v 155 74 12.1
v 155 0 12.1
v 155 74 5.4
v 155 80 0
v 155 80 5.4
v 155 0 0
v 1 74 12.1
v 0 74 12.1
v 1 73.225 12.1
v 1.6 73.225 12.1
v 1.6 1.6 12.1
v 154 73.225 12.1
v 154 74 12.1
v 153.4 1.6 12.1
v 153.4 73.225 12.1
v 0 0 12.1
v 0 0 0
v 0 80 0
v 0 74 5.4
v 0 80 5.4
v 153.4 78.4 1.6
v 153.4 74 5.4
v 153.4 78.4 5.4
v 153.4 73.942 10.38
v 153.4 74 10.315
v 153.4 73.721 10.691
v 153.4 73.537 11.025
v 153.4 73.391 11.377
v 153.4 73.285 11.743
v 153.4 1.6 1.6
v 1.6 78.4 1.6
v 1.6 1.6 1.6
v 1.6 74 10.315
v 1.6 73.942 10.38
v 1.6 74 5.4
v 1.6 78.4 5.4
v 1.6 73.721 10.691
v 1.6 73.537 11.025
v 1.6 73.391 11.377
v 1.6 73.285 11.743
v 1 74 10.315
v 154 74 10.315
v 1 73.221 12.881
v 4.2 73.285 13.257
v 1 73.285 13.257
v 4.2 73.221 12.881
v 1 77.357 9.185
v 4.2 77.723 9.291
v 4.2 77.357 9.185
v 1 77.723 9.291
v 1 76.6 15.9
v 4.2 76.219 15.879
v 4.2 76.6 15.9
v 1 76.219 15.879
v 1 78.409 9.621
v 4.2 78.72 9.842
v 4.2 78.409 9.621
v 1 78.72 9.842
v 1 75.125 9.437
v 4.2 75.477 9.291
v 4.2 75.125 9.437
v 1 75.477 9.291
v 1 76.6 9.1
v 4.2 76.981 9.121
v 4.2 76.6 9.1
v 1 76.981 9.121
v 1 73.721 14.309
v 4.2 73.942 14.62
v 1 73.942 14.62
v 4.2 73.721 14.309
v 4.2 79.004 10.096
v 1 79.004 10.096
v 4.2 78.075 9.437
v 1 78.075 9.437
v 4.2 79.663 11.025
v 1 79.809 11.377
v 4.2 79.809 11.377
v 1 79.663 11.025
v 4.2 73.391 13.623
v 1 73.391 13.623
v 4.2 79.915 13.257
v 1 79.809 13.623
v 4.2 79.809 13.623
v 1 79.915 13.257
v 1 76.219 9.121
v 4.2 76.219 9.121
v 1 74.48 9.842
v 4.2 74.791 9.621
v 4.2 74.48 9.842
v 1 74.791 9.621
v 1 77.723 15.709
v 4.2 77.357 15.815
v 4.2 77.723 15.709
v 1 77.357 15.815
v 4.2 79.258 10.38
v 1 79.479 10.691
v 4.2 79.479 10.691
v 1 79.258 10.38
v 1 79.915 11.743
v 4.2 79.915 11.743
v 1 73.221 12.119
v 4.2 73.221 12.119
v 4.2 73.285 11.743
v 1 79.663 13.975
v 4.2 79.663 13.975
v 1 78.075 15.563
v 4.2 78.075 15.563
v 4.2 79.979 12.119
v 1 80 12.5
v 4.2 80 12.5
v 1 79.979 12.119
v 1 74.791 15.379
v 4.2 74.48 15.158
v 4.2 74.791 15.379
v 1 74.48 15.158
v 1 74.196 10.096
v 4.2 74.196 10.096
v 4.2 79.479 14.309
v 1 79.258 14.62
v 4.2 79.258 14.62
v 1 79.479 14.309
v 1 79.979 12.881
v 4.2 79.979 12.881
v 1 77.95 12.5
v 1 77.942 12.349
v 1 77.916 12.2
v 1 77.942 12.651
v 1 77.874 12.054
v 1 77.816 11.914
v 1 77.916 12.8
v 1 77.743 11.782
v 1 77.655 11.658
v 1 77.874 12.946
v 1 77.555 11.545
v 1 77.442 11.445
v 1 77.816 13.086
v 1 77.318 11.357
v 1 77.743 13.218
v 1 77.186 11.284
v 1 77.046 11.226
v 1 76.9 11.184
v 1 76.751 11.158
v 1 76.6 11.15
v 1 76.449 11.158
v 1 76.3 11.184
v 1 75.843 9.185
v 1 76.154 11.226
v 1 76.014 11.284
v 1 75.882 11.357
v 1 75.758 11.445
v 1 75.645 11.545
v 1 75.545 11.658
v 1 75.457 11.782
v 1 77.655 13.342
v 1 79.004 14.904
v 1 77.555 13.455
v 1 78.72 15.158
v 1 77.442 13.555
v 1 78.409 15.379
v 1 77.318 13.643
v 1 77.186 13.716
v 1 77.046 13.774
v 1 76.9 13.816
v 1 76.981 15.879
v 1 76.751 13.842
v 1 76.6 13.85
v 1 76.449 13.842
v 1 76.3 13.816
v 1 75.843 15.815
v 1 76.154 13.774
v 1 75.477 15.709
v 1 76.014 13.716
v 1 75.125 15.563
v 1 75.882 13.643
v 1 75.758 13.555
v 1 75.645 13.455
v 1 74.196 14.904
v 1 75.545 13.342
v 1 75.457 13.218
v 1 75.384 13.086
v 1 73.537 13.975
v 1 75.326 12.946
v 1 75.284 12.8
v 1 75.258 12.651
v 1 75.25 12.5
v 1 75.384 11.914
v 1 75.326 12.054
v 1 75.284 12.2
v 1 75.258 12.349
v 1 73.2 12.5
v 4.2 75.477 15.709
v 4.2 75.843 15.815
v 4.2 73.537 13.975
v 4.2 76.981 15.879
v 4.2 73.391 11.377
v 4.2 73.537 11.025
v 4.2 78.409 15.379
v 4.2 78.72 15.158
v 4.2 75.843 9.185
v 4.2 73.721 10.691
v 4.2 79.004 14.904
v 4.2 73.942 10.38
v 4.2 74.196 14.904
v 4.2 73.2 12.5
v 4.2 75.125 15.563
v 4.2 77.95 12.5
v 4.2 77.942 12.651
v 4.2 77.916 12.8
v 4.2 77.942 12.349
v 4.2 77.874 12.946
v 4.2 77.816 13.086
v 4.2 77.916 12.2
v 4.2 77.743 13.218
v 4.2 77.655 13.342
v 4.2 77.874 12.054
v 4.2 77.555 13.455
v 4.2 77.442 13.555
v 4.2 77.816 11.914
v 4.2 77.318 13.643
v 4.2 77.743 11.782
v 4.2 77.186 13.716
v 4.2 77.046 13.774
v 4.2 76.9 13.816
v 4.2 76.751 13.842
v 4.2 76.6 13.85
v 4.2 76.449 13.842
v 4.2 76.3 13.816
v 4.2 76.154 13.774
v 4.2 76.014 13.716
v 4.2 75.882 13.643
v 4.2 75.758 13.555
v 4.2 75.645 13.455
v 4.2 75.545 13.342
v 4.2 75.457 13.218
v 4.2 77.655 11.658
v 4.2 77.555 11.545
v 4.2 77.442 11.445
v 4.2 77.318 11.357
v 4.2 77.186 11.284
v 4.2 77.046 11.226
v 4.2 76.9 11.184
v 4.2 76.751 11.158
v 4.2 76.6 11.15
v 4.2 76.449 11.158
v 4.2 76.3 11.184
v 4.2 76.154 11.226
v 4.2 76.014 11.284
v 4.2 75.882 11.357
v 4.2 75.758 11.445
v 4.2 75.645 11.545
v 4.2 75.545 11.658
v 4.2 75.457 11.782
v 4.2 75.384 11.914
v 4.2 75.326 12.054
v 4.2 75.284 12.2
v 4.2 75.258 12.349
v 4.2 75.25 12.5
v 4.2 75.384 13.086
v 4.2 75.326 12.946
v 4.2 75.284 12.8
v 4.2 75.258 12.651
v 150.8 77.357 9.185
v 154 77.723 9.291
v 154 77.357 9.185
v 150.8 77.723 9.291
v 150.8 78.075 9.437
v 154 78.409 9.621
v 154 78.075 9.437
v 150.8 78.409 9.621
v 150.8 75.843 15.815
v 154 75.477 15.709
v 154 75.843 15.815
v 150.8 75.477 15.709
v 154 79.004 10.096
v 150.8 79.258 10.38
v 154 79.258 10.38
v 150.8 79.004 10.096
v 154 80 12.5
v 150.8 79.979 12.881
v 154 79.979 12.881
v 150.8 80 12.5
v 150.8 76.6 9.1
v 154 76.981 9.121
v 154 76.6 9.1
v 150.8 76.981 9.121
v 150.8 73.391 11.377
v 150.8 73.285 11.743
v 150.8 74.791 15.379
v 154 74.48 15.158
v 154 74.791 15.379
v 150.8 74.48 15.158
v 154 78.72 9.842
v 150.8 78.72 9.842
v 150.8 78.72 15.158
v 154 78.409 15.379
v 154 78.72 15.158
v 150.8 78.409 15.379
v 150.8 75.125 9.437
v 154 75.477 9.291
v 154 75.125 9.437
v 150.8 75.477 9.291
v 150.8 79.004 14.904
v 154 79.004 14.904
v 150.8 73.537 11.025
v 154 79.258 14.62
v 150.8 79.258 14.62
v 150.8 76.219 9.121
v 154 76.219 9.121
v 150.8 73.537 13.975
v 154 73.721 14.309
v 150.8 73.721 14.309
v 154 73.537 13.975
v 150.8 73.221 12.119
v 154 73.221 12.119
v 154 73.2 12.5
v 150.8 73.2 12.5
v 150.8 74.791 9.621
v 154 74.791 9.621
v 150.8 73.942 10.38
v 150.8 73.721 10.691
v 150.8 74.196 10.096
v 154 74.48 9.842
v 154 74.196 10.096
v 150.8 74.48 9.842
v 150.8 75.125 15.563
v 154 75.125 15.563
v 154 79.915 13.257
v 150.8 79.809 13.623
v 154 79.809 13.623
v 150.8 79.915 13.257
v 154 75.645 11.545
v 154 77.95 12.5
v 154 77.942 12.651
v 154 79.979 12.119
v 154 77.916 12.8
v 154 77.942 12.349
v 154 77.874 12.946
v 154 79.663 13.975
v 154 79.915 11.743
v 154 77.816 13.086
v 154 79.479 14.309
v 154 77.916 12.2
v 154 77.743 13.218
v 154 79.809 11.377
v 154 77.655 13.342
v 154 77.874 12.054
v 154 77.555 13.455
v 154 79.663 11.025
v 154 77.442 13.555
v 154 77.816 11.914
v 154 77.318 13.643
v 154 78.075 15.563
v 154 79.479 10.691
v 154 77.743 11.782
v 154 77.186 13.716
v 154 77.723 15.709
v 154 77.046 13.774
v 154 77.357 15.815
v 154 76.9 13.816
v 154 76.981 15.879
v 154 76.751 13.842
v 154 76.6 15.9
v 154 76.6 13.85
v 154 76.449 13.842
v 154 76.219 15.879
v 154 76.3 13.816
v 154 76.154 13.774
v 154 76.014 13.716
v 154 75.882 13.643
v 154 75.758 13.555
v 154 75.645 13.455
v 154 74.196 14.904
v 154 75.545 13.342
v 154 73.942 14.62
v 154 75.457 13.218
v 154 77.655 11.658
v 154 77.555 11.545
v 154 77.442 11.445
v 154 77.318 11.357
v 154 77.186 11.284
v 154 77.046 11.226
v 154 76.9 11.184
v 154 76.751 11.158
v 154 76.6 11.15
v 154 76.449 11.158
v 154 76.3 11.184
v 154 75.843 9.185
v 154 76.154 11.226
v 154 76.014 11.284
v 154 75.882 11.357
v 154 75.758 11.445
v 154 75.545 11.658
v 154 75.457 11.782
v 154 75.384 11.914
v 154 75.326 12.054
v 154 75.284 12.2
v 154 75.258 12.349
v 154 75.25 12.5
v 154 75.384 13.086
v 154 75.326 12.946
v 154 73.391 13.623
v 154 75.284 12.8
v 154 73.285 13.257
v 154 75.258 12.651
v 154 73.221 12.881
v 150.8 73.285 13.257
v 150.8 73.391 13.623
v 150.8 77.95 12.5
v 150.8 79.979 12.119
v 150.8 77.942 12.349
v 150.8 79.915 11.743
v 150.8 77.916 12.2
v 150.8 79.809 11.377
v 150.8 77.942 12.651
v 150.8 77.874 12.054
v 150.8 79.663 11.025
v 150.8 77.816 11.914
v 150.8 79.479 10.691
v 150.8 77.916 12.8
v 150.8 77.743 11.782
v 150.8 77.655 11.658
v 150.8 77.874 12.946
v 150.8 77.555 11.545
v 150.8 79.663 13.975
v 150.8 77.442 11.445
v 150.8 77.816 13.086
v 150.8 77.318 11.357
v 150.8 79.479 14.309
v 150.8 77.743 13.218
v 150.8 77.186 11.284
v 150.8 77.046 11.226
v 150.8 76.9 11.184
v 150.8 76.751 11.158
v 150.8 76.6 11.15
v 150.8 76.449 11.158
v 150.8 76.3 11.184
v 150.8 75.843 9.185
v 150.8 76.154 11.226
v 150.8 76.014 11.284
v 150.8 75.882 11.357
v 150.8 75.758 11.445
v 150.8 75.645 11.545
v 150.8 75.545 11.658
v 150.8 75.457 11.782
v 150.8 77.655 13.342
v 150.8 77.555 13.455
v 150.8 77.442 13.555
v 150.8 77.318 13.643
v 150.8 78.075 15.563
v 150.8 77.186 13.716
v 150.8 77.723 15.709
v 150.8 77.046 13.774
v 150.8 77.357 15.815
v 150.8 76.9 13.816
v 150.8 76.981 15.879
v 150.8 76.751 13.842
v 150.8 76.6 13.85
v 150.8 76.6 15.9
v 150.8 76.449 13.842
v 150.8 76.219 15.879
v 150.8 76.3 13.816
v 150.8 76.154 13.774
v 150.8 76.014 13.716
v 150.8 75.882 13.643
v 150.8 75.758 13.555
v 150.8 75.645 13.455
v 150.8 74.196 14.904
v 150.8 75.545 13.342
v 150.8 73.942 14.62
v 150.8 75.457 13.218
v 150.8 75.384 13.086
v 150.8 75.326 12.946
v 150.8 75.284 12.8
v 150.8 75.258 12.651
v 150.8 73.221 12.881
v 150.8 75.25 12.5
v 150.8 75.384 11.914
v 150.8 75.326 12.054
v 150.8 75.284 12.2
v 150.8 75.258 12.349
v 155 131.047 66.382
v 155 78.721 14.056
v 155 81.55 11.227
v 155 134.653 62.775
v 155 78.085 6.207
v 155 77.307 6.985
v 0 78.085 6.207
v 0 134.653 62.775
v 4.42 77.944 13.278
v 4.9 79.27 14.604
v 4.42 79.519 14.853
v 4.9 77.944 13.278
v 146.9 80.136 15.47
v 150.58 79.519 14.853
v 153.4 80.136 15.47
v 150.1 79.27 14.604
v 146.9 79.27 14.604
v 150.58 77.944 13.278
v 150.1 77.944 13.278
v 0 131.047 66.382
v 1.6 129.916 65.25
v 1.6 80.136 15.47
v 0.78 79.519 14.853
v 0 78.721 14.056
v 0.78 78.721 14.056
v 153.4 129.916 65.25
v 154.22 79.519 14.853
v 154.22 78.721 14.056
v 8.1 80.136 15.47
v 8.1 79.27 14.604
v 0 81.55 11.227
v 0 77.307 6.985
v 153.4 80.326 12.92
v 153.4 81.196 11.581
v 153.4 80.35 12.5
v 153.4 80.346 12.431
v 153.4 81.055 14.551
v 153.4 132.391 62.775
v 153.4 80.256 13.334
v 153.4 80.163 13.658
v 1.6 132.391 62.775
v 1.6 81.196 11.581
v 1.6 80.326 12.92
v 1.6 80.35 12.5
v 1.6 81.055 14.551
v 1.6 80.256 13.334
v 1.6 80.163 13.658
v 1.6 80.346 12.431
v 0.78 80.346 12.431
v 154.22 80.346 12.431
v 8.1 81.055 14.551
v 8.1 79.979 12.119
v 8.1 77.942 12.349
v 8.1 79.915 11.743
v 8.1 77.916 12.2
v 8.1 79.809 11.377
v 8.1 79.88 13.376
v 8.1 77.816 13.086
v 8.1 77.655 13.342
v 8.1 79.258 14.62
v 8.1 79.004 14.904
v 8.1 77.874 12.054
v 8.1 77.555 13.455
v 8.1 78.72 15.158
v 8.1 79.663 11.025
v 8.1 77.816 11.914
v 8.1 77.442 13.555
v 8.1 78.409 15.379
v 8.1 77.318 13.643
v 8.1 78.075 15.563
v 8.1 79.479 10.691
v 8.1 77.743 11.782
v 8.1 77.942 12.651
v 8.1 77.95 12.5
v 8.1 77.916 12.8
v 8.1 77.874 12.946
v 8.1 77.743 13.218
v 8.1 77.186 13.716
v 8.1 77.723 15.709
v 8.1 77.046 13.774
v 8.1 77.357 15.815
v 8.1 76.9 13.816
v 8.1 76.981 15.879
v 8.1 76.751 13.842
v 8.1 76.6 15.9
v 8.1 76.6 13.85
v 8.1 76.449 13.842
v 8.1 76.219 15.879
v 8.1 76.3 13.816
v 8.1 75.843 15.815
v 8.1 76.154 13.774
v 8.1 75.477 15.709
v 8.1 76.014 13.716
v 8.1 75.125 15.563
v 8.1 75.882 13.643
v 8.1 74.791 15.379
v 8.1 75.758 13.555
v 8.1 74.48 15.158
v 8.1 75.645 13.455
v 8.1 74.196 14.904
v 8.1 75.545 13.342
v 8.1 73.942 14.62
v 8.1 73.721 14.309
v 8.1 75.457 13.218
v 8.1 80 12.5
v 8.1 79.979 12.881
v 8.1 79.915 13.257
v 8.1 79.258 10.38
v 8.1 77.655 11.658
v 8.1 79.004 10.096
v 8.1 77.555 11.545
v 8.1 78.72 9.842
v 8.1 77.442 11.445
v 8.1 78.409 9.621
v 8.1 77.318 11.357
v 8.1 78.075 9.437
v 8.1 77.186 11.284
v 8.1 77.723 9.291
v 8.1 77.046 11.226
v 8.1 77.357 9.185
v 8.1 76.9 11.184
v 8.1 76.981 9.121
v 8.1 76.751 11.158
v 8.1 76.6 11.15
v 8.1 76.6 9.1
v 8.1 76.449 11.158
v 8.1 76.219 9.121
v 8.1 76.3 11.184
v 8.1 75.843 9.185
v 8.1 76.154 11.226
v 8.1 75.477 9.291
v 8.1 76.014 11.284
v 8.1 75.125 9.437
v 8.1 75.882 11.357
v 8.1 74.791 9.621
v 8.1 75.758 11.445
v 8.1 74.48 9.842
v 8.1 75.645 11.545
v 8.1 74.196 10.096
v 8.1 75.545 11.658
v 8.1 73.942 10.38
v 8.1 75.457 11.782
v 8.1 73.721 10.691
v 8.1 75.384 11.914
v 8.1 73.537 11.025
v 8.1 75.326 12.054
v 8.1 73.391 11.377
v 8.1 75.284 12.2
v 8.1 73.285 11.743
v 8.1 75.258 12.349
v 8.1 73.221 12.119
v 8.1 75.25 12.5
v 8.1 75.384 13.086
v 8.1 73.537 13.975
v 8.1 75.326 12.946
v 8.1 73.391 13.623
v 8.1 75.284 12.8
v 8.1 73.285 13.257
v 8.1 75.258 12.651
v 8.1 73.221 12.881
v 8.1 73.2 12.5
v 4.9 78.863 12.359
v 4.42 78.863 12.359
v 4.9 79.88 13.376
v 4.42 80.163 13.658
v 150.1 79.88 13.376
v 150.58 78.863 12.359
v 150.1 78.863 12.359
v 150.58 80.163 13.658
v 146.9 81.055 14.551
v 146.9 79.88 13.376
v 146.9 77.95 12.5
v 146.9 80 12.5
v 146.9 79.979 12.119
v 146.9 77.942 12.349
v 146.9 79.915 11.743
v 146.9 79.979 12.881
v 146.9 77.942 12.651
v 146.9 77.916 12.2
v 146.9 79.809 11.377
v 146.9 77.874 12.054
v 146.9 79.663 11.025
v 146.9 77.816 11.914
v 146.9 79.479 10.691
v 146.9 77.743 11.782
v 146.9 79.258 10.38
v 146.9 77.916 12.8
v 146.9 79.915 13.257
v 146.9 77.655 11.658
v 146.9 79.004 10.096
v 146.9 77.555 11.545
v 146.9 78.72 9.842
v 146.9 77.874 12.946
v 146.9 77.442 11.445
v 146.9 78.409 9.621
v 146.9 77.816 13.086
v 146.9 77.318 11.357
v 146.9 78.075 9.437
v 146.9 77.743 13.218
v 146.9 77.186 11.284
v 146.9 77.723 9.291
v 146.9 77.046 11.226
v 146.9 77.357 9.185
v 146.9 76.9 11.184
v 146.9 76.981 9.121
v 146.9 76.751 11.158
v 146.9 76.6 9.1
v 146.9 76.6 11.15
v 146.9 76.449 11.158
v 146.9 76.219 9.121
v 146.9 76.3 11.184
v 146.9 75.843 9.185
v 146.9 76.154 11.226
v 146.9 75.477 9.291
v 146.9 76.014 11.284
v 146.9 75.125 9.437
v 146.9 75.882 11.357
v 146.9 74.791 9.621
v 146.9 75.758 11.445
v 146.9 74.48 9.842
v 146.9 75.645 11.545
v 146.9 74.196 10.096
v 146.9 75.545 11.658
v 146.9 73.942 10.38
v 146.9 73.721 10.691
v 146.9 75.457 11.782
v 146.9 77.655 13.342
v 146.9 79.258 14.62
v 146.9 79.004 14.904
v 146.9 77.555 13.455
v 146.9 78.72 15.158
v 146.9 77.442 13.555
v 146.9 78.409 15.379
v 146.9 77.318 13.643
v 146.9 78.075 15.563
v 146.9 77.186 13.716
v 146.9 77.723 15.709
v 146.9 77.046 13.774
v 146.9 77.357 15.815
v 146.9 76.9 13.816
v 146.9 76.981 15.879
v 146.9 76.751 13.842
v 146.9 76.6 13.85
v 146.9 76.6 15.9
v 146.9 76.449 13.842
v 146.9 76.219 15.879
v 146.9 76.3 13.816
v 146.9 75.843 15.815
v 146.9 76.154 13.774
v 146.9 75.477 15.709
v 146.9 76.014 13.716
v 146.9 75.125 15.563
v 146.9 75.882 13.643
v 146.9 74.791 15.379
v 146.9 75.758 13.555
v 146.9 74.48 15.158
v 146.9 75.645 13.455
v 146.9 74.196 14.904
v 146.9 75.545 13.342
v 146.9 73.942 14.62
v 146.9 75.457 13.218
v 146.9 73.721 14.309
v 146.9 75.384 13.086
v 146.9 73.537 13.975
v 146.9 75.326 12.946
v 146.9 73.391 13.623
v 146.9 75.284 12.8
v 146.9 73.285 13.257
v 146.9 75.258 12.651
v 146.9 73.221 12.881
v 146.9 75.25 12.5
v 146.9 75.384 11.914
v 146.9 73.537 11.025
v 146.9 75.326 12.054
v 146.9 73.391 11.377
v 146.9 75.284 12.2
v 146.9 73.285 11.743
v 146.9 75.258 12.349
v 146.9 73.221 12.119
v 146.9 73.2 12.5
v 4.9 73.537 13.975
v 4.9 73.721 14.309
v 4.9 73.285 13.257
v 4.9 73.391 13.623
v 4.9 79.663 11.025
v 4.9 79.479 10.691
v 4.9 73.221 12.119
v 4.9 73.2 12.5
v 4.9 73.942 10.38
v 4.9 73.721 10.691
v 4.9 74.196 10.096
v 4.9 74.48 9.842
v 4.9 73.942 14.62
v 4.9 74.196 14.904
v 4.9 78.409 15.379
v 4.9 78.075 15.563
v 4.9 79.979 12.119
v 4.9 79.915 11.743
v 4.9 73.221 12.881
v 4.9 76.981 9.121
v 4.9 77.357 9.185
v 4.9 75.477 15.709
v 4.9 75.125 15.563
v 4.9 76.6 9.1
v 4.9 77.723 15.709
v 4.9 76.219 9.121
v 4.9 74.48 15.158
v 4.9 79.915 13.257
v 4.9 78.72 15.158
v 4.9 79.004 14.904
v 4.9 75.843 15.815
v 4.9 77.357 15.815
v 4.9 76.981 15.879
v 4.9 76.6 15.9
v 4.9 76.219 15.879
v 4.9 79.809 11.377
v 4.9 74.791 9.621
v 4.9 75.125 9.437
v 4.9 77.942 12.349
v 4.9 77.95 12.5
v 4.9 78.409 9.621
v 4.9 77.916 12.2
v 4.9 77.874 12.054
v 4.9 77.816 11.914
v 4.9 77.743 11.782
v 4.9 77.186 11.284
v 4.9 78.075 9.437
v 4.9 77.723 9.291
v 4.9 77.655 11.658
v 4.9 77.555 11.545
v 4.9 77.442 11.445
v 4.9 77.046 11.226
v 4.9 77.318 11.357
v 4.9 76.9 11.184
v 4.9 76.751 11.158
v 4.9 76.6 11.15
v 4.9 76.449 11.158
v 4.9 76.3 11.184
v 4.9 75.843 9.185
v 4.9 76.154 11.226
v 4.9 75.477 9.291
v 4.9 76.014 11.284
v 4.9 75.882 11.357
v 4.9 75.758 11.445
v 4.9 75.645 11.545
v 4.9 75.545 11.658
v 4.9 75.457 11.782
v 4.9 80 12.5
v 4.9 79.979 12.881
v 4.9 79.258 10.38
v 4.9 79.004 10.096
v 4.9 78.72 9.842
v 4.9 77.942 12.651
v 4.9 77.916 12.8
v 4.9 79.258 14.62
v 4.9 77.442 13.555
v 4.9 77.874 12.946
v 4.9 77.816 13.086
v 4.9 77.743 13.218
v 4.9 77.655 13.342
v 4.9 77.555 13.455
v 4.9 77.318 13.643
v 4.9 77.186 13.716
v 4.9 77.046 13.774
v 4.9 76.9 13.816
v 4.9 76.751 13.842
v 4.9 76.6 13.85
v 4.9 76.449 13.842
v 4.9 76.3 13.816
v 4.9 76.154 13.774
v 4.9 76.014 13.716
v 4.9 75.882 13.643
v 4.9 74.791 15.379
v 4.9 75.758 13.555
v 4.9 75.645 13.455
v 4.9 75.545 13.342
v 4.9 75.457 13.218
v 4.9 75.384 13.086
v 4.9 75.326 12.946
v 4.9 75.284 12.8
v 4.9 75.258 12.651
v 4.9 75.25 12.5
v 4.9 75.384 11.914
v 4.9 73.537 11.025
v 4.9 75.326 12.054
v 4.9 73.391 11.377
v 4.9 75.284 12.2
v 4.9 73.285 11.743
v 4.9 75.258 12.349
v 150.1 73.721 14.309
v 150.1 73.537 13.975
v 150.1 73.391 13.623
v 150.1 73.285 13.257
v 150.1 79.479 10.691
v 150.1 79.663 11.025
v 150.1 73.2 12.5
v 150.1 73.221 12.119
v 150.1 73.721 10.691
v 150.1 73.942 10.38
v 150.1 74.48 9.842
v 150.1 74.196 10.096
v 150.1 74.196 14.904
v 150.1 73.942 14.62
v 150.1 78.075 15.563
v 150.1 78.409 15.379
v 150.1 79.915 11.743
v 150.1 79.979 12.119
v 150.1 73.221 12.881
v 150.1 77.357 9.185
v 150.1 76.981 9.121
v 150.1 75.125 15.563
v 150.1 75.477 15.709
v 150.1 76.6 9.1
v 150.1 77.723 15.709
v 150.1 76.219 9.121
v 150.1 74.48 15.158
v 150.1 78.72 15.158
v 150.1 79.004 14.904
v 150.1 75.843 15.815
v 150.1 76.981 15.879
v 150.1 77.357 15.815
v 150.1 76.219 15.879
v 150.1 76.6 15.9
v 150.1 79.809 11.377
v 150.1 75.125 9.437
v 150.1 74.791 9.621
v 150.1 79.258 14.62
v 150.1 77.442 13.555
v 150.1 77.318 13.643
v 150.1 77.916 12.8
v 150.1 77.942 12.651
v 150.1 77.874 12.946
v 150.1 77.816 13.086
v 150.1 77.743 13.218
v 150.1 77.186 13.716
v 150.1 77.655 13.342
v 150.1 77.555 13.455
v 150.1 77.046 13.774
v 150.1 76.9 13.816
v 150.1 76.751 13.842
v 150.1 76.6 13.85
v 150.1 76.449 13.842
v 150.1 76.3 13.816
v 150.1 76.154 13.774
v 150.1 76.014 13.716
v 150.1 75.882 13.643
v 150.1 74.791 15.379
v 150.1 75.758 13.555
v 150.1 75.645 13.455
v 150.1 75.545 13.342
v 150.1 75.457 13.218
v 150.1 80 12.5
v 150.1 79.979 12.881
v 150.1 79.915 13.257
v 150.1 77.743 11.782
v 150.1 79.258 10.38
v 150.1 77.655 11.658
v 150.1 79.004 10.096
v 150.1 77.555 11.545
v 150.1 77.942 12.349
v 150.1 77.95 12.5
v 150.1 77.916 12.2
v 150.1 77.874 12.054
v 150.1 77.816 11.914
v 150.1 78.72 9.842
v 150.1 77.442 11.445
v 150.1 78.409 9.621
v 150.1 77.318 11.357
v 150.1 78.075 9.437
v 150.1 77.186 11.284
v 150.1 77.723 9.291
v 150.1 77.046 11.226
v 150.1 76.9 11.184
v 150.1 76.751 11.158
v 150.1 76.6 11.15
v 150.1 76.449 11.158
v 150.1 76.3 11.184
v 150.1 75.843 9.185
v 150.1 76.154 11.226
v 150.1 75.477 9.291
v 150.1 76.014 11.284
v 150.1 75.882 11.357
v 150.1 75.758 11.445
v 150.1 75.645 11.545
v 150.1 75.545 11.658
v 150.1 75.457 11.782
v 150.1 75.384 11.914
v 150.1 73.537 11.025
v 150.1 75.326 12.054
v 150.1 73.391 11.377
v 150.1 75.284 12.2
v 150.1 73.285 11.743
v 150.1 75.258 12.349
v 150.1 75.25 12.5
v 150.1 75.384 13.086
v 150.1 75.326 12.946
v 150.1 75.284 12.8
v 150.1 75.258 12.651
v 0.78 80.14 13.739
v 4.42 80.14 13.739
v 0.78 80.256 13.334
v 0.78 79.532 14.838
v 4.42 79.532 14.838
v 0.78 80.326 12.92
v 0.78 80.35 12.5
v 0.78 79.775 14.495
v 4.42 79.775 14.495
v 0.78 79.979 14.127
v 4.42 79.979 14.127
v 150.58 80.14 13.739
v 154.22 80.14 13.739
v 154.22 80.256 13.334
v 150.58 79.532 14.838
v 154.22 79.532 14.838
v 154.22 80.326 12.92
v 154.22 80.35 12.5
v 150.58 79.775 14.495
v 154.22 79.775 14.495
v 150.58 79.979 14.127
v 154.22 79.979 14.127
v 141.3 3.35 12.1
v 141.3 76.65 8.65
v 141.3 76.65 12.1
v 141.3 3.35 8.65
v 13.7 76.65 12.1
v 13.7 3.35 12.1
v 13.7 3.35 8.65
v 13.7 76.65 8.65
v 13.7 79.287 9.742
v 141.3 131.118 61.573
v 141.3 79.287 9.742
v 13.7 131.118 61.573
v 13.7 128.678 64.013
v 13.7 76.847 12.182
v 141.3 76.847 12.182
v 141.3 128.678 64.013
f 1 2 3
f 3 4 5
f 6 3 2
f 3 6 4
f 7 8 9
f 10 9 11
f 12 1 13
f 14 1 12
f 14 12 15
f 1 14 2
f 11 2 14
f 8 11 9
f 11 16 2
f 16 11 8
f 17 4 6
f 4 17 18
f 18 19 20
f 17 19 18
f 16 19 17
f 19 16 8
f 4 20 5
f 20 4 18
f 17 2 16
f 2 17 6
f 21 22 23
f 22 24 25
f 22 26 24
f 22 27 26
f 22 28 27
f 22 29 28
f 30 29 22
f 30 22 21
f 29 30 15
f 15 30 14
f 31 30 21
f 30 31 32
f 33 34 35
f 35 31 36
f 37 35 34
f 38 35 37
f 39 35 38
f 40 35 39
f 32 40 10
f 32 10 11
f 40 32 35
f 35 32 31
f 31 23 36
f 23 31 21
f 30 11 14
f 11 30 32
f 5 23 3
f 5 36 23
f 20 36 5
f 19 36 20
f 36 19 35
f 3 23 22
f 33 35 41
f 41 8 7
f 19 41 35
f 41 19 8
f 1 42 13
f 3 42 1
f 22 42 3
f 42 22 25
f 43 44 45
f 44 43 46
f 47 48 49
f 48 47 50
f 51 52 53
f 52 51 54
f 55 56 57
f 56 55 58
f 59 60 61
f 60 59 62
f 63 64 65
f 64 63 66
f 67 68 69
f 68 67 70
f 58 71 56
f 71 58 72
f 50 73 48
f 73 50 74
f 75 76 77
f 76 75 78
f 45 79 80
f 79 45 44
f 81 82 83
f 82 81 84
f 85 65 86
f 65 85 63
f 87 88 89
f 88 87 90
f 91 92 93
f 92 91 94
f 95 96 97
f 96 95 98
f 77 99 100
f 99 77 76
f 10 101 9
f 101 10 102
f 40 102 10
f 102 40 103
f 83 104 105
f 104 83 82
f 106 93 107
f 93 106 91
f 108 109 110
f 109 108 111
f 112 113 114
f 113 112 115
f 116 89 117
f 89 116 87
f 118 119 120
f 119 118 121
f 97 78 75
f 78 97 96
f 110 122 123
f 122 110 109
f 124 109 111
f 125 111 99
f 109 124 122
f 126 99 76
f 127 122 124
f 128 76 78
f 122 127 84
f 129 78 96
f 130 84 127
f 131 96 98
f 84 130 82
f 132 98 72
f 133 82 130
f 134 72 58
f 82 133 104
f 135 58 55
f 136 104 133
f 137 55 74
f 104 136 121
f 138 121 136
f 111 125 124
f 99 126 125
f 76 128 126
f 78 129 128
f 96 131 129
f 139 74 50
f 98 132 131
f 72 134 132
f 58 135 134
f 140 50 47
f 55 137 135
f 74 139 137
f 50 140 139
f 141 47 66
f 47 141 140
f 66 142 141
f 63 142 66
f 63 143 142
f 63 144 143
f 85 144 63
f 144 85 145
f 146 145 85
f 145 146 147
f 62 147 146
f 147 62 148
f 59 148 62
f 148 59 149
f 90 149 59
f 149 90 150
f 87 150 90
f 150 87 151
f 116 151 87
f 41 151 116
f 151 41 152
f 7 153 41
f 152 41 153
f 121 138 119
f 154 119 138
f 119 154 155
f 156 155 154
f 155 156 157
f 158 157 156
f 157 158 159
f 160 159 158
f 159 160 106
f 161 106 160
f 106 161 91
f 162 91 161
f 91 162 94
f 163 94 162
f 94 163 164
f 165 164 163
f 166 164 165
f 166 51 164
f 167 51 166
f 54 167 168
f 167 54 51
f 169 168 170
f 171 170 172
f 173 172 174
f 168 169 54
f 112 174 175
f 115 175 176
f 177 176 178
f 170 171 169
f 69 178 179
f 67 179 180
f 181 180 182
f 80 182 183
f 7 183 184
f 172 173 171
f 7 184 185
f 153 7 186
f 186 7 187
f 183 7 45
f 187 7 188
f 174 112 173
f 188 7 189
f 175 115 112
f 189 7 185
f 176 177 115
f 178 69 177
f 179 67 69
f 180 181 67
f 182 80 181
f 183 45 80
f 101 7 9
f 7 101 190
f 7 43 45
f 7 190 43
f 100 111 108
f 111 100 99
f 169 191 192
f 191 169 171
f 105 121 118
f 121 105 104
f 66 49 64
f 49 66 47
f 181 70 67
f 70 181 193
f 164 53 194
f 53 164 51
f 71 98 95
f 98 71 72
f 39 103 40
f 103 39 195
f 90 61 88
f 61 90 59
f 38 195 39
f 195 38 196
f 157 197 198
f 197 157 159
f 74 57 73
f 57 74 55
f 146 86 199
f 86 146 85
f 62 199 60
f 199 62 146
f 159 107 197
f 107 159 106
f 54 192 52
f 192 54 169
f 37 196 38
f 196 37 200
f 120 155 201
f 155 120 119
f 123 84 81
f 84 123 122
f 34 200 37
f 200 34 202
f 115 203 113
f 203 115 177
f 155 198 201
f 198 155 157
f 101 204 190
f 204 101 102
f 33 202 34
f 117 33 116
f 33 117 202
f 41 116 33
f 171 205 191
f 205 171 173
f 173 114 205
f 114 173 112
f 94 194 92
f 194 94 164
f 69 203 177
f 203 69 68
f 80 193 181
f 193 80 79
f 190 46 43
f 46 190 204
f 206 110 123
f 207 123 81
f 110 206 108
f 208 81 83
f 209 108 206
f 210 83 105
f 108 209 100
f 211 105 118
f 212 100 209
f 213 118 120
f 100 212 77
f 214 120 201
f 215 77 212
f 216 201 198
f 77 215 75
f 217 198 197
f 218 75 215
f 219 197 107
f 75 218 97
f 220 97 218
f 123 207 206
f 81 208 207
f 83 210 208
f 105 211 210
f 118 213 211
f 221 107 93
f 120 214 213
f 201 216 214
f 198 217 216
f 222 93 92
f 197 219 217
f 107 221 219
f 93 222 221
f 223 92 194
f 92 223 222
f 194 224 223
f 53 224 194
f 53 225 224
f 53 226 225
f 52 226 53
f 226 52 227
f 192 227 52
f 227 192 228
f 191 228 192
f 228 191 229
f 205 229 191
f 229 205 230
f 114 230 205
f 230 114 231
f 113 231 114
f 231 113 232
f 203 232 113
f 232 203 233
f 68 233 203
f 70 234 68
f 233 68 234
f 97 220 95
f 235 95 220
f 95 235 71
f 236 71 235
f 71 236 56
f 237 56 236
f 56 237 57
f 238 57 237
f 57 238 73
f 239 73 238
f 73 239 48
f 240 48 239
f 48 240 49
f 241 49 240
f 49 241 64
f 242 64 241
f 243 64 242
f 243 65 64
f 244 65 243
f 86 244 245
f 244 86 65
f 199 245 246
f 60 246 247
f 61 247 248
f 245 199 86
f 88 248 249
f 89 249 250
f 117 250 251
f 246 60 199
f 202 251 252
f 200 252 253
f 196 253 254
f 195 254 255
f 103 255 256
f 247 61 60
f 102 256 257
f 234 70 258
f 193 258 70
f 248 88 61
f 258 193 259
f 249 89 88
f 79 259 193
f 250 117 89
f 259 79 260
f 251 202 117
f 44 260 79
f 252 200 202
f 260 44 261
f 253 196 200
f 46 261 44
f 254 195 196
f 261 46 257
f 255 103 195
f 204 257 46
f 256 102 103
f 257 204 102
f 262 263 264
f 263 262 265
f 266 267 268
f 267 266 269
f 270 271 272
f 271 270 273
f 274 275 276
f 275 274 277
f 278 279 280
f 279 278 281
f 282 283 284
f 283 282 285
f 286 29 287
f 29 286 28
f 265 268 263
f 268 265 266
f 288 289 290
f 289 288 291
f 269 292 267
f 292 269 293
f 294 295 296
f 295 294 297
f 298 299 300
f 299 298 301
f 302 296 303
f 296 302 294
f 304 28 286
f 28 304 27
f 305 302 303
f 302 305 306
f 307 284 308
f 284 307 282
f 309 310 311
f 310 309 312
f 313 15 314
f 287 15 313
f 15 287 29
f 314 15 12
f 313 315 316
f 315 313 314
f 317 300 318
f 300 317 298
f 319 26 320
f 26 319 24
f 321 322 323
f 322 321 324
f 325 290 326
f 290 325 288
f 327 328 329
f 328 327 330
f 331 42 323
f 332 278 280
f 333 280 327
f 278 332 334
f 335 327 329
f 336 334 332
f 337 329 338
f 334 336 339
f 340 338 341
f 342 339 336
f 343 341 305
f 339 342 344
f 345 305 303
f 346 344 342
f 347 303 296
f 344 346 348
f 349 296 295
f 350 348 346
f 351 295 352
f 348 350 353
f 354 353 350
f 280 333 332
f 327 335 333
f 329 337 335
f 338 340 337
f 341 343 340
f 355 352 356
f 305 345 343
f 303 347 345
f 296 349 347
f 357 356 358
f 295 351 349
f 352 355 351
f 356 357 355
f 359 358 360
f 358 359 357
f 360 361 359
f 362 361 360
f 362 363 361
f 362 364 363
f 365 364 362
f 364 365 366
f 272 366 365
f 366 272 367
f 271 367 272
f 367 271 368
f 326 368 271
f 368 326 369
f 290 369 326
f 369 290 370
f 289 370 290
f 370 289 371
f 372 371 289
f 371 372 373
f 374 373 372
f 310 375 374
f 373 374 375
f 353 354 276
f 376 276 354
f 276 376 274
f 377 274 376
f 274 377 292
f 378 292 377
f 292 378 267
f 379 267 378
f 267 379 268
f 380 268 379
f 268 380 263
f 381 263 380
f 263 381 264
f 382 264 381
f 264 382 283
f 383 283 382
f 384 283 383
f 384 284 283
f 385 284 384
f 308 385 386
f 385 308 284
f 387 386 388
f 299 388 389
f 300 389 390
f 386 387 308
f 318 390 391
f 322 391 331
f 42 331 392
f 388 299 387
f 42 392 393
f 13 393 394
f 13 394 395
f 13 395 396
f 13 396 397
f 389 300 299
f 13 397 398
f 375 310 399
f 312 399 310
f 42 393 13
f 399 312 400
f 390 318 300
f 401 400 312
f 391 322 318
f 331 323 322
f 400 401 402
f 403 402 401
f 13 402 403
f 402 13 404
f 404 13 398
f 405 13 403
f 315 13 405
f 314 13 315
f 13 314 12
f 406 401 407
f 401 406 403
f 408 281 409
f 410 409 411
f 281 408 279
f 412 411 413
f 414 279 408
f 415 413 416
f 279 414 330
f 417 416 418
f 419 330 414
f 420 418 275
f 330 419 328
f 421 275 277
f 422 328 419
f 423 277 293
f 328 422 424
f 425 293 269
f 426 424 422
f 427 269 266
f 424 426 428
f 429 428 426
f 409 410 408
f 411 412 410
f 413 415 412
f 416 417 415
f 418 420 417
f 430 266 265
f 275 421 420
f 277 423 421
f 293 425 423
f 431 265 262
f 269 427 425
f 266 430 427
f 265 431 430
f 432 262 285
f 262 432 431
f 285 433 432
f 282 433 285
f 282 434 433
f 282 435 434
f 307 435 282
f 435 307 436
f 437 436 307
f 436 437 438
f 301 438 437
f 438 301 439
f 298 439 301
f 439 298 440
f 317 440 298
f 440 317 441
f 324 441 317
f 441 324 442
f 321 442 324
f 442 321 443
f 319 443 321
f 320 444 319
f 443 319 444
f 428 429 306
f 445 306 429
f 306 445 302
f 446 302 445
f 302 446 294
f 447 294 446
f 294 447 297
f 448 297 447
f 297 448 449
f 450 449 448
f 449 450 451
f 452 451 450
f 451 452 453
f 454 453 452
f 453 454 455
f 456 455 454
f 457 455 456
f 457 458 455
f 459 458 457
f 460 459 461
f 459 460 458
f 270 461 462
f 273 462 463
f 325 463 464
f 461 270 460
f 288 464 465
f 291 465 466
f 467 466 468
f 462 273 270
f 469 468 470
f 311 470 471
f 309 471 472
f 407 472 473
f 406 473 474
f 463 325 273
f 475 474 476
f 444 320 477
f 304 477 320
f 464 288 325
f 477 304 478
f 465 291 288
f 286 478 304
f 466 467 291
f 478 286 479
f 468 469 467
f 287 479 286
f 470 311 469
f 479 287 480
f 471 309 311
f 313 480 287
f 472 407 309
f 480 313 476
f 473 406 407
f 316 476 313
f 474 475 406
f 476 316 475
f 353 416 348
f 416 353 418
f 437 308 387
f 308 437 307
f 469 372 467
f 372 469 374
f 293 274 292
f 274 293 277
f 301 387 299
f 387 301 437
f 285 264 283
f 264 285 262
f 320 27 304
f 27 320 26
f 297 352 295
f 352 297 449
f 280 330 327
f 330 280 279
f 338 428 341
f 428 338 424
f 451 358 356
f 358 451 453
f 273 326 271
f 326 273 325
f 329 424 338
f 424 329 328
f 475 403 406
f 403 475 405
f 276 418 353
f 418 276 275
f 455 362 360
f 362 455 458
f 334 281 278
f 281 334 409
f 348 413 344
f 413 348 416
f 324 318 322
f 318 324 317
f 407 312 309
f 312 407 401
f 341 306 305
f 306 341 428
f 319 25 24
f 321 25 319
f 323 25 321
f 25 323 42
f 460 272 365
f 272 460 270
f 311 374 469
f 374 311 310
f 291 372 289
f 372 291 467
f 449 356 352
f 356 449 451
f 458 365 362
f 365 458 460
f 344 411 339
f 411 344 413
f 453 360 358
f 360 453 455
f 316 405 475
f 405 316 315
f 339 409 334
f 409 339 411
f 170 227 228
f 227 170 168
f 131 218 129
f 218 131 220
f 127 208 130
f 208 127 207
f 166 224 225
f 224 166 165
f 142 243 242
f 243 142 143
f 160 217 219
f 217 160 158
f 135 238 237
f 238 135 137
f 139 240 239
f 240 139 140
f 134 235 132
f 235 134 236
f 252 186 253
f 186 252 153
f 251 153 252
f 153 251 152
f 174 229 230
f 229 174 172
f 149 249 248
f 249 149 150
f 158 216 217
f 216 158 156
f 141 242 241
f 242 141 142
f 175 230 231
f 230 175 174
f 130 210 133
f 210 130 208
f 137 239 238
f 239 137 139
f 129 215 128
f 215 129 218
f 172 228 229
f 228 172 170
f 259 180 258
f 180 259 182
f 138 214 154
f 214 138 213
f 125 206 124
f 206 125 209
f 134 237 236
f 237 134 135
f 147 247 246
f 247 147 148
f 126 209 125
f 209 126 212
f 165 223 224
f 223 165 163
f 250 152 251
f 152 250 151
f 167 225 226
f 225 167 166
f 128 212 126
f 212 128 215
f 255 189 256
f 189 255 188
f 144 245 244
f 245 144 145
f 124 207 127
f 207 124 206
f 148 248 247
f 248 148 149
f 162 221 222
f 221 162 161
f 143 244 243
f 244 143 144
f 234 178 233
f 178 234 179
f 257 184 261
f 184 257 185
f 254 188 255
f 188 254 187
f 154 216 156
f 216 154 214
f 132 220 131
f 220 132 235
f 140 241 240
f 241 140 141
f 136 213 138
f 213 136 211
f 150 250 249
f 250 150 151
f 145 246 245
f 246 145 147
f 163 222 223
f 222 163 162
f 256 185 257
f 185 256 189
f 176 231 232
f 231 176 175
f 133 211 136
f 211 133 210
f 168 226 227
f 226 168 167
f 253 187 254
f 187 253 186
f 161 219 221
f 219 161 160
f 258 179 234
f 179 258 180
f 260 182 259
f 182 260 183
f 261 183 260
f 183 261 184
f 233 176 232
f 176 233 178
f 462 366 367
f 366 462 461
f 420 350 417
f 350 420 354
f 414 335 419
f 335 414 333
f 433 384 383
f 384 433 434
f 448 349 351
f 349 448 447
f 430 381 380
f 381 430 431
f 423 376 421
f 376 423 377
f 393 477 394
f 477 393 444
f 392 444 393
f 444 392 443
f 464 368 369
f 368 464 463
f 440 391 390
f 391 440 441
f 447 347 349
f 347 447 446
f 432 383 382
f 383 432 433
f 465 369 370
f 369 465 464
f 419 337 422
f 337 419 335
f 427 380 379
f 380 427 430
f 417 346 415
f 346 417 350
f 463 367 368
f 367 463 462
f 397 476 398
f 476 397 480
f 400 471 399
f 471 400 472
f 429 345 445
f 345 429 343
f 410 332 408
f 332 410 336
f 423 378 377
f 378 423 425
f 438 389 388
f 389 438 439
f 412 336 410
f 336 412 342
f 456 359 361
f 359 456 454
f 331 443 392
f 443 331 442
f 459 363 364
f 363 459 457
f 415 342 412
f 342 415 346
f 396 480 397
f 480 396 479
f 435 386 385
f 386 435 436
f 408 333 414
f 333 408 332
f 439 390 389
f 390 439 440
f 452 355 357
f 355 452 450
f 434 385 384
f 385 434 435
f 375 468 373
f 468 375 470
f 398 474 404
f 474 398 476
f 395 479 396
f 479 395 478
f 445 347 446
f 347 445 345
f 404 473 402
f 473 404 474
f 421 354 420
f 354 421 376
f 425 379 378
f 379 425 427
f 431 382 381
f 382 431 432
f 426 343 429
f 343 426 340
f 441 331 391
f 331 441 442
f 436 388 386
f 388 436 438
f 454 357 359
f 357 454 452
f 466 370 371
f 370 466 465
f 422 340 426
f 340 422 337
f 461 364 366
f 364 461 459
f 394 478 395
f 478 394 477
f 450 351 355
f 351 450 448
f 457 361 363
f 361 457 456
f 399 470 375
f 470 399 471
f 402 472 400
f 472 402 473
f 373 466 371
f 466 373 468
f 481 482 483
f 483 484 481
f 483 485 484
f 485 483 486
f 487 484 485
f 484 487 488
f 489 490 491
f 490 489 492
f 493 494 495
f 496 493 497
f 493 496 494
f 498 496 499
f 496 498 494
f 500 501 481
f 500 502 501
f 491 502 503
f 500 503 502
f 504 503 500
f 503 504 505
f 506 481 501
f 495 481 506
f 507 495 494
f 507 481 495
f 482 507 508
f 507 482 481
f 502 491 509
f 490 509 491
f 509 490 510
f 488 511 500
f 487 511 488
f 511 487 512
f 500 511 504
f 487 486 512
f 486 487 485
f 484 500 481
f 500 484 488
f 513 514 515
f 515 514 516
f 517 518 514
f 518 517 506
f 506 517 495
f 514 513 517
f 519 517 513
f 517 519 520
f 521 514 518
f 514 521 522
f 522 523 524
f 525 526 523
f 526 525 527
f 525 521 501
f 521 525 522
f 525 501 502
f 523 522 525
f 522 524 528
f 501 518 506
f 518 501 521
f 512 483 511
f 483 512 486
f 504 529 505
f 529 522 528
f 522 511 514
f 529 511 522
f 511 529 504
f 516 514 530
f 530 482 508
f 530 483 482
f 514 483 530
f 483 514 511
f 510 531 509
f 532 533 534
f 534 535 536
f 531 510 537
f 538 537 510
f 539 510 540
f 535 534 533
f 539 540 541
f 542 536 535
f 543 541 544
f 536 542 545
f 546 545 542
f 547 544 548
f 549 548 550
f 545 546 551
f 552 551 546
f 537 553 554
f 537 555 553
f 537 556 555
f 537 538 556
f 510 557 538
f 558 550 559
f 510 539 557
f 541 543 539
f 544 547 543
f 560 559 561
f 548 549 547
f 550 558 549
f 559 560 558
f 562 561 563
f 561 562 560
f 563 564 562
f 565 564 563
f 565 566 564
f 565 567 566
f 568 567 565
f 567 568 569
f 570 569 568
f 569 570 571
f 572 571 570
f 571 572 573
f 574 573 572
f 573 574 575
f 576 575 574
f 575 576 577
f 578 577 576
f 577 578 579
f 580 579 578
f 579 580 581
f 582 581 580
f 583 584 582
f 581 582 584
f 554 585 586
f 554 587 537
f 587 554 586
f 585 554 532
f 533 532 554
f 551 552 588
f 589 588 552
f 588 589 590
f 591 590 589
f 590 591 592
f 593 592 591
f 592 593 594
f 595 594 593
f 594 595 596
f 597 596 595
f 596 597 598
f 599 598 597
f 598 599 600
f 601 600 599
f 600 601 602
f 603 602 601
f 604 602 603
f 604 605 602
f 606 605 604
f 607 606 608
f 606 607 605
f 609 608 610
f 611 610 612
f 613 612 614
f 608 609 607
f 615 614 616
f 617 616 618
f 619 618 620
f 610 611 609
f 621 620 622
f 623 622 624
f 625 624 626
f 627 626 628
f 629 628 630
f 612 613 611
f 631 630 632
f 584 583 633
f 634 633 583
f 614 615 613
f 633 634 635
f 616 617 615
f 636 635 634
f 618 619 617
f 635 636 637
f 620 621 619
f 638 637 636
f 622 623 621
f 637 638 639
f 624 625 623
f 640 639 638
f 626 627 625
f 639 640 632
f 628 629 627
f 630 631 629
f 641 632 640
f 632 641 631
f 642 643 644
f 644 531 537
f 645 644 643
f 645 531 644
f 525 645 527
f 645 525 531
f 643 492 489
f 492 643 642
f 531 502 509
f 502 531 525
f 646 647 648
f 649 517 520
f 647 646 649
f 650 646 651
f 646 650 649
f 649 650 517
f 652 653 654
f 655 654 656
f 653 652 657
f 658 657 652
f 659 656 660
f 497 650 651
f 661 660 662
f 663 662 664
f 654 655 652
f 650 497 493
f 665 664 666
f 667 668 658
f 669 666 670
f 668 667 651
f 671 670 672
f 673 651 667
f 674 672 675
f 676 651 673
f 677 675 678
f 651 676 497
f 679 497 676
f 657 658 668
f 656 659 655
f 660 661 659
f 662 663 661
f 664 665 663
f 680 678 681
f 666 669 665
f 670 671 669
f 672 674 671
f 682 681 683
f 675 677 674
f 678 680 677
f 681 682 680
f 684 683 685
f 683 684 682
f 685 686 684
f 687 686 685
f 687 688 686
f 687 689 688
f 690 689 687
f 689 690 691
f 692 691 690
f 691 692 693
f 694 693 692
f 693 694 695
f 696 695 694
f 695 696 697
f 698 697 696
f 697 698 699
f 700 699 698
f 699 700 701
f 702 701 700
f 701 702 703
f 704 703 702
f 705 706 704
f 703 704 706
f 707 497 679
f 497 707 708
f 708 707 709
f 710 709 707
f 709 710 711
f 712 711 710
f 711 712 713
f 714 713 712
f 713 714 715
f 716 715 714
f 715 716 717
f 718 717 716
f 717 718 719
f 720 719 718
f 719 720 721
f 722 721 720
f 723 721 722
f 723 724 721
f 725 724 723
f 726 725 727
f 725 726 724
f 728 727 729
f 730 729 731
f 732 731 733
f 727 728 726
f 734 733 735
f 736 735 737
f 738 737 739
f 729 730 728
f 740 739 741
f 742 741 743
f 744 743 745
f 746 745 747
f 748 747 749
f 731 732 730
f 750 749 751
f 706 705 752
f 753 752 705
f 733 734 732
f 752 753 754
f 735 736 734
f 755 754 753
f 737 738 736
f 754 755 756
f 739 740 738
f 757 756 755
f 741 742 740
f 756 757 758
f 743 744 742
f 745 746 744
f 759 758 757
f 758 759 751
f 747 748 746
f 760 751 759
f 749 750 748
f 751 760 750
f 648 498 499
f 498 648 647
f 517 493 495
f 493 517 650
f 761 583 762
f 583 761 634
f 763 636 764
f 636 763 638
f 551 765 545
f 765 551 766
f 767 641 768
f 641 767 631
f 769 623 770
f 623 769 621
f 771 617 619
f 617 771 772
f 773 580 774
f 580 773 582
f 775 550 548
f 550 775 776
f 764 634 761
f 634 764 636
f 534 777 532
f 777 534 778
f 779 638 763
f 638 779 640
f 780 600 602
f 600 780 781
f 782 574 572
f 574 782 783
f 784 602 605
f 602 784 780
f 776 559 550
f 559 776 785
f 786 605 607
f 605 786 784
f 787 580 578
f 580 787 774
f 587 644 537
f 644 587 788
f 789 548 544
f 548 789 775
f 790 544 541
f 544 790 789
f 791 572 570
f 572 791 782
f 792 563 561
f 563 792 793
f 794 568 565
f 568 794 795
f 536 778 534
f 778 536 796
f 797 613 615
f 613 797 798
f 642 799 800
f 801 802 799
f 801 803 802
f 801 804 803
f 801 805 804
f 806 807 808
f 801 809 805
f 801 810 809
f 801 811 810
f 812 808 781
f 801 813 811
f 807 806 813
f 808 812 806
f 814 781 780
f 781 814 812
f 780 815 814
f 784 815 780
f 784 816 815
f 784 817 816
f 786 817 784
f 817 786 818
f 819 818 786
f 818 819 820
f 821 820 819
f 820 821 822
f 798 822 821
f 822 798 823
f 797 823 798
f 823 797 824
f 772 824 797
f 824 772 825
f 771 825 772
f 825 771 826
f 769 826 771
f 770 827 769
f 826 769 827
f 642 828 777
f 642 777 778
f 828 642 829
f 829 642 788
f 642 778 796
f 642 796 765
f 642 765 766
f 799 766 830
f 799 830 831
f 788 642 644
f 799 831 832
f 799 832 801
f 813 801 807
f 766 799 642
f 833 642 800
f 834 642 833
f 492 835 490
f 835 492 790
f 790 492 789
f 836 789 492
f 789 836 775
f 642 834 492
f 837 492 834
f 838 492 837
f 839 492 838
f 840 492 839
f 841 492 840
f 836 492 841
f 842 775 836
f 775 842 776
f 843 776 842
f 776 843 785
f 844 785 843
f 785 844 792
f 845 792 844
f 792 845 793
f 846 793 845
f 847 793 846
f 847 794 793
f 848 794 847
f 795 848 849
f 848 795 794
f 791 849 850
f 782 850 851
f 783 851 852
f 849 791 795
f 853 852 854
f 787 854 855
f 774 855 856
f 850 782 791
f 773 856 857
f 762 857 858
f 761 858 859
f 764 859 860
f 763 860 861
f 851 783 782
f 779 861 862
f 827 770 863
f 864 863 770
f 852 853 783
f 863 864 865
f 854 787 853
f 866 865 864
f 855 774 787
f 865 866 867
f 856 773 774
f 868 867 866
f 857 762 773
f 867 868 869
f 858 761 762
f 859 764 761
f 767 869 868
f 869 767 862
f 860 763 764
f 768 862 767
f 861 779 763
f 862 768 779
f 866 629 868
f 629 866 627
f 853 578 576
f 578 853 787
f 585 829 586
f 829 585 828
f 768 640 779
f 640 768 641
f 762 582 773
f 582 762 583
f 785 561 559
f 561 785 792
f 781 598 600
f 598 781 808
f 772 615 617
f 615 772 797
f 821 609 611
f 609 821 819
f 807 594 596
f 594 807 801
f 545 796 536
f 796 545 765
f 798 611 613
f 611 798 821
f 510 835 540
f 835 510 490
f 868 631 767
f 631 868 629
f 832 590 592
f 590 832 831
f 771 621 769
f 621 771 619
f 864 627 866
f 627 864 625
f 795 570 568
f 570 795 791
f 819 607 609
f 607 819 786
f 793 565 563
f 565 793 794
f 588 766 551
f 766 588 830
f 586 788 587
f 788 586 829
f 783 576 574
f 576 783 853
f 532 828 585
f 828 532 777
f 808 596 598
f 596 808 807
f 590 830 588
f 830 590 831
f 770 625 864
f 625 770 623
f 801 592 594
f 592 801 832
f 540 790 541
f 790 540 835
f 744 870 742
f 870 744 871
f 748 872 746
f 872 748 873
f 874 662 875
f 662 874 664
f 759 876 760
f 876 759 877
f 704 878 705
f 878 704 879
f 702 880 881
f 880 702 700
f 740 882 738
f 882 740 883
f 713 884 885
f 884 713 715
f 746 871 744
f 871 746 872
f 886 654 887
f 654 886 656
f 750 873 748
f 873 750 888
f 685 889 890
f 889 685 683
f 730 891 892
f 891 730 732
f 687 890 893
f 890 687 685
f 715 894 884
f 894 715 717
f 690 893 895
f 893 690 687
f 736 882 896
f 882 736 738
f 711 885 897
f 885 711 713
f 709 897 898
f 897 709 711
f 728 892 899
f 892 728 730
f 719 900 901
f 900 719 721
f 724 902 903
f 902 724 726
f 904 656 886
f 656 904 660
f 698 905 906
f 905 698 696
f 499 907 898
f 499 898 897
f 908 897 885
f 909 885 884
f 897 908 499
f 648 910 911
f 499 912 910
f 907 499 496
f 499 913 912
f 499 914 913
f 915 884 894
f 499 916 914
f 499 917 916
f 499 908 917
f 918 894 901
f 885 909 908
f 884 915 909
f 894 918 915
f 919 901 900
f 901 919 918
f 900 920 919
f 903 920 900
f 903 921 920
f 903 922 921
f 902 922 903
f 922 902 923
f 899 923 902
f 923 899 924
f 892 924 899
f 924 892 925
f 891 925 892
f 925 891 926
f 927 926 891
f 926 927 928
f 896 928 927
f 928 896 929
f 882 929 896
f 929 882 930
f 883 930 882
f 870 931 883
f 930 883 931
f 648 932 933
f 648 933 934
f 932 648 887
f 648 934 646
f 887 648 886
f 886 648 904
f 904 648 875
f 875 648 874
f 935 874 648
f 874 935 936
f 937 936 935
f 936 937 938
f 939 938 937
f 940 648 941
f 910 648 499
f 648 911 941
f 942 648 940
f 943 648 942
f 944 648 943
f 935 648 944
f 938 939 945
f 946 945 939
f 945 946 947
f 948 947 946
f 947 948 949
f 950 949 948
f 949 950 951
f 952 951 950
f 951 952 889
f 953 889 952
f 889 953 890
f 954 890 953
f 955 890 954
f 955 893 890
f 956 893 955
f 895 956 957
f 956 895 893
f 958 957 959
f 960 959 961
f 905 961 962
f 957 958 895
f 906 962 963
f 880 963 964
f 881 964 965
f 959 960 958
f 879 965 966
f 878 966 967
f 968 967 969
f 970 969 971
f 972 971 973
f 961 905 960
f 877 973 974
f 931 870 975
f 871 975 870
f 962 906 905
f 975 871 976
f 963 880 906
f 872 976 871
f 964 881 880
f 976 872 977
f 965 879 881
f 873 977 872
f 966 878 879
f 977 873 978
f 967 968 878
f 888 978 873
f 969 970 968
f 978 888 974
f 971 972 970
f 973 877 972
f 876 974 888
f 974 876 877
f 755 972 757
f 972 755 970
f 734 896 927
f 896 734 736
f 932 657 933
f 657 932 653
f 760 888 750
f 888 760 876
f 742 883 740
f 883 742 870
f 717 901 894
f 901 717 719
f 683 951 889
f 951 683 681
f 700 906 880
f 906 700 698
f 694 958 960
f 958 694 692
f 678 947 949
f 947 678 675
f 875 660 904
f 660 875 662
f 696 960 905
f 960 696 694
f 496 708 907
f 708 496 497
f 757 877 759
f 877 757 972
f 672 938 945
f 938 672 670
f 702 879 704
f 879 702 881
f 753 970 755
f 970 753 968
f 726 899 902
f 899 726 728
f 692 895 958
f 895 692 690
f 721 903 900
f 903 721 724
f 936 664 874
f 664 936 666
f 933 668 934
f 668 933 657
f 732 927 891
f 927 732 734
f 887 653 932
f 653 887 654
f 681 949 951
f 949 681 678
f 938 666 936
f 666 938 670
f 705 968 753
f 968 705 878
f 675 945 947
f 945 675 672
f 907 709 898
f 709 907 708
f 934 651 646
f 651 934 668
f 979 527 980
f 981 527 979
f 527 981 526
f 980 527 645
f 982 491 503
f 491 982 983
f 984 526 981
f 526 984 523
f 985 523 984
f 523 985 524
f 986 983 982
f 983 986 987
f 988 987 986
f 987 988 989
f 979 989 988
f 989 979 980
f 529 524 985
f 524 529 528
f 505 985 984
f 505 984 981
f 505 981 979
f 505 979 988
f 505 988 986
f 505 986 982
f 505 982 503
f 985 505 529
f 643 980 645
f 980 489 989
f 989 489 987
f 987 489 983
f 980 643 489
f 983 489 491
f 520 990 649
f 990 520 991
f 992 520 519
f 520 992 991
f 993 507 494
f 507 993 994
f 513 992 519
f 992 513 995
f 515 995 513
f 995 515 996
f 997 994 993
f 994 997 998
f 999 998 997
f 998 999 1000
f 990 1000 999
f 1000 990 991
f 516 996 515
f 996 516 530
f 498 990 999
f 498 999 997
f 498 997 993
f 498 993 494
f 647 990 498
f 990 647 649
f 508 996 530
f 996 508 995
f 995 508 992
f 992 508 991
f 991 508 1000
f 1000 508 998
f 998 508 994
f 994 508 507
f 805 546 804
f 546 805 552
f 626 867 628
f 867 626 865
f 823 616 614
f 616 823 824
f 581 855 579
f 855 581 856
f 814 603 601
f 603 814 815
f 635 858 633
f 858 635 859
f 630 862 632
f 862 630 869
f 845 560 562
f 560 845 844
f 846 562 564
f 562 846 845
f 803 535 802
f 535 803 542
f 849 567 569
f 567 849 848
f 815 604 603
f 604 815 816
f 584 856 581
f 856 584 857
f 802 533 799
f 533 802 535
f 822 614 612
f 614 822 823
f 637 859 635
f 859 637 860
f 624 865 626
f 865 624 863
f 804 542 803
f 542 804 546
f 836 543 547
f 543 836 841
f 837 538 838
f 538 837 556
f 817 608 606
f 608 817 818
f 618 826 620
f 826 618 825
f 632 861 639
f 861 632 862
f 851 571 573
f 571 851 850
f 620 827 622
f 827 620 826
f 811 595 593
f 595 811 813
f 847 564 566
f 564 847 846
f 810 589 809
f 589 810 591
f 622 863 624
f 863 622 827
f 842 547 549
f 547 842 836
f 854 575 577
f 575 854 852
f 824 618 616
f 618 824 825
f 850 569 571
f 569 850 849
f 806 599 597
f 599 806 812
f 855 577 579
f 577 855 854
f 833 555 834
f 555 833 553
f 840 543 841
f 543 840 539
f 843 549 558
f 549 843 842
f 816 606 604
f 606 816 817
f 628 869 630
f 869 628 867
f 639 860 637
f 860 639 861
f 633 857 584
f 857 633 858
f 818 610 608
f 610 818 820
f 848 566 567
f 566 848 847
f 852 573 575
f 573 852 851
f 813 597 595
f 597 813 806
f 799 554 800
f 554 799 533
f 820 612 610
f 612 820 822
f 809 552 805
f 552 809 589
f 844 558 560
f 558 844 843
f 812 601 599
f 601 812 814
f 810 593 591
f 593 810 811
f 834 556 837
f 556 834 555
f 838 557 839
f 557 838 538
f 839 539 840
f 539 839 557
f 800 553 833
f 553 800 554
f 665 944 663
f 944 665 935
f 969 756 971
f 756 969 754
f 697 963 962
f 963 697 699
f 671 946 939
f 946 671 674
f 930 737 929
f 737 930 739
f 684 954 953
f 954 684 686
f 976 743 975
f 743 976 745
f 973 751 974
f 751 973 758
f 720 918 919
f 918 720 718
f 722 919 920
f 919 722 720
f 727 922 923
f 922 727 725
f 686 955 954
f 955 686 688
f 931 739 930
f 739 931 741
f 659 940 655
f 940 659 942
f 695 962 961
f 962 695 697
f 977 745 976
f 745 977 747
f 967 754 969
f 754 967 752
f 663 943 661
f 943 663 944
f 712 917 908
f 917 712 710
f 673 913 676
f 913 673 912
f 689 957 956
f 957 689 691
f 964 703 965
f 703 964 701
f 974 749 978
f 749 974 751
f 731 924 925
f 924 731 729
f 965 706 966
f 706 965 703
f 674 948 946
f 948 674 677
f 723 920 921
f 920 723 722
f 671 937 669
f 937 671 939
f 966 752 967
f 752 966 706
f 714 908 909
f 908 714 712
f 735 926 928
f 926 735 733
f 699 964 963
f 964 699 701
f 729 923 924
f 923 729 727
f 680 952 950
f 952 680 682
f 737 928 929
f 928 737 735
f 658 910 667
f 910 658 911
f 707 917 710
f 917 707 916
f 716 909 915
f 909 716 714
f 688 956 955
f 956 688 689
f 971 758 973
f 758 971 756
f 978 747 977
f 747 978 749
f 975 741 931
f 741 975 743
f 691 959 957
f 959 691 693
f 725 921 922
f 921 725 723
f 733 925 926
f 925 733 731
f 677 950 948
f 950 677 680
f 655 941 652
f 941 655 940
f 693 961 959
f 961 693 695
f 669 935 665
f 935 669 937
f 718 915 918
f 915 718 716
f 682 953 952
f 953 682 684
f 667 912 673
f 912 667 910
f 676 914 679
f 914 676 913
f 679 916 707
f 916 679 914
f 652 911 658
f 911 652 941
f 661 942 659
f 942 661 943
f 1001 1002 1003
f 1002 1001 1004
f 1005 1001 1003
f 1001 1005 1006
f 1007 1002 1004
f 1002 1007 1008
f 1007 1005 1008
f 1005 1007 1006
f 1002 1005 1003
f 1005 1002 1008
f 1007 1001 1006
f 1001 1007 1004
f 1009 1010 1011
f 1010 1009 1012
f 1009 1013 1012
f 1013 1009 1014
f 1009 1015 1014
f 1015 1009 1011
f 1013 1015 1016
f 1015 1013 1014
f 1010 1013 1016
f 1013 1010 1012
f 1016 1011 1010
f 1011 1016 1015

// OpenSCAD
// file: lid_shell.scad
// Native Mecha-Splicer side-pin hinge. CAD ONLY; no metal pin, no verified flex/stop/torque.
// Hinge is fully enclosed in the declared closed XY silhouette.
$fn=56;
W=155.0; D=80.0; wall=1.6; floor=1.6;
HBASE=12.1; HLID=5.1; gap=0.8;
hy=76.6; hz=12.5;
kr=3.4; bore=2.7;

module lid_shell() {
  difference() {
    union() {
      difference() {
        translate([0,0,12.9]) cube([W,D,HLID]);
        translate([wall,wall,12.8]) cube([W-2*wall,D-2*wall,HLID-floor+0.1]);
        // Remove the lower rear wall in swing zone (shell only).
        translate([-0.1,74.0,12.8]) cube([W+0.2,6.1,4.1]);
      }
// Anchor ears join the inner lid barrels back to outer side rails.
      translate([1.0,72.0,12.9]) cube([7.1000000000000005,3.1,1.3]);
      translate([146.9,72.0,12.9]) cube([7.1000000000000005,3.1,1.3]);
// The two lid barrels lie axially beside the base barrels.
      translate([4.9,hy,hz]) rotate([0,90,0]) cylinder(h=3.2,r=3.4);
      translate([146.9,hy,hz]) rotate([0,90,0]) cylinder(h=3.2,r=3.4);
    }
// Relieve lid shell material for both base hinge barrels.
    translate([0.78,hy,hz]) rotate([0,90,0]) cylinder(h=3.64,r=3.75);
    translate([150.58,hy,hz]) rotate([0,90,0]) cylinder(h=3.64,r=3.75);
    translate([4.78,hy,hz]) rotate([0,90,0]) cylinder(h=3.4400000000000004,d=bore);
    translate([146.78,hy,hz]) rotate([0,90,0]) cylinder(h=3.4400000000000004,d=bore);
// Upper LCD requires separate signal AND touch flex routes.
    translate([63.5,D-wall-0.1,12.8]) cube([28,wall+0.2,3.6]);
  }
}
lid_shell();
// file: base_shell.scad
// Native Mecha-Splicer side-pin hinge. CAD ONLY; no metal pin, no verified flex/stop/torque.
// Hinge is fully enclosed in the declared closed XY silhouette.
$fn=56;
W=155.0; D=80.0; wall=1.6; floor=1.6;
HBASE=12.1; HLID=5.1; gap=0.8;
hy=76.6; hz=12.5;
kr=3.4; bore=2.7;

module base_shell() {
  difference() {
    union() {
      difference() {
        cube([W,D,HBASE]);
        translate([wall,wall,floor]) cube([W-2*wall,D-2*wall,HBASE+1]);
        // Remove the upper rear wall in swing zone (shell only).
        translate([-0.1,74.0,HBASE-6.7]) cube([W+0.2,6.1,6.9]);
      }
// Side pivot barrels tie into the rear shell wall at both ends.
      translate([1.0,hy,hz]) rotate([0,90,0]) cylinder(h=3.2,r=3.4);
      translate([150.8,hy,hz]) rotate([0,90,0]) cylinder(h=3.2,r=3.4);
    }
// Sculpt relief for the rotating *lid* barrels within the base wall.
    translate([4.680000000000001,hy,hz]) rotate([0,90,0]) cylinder(h=3.64,r=3.75);
    translate([146.68,hy,hz]) rotate([0,90,0]) cylinder(h=3.64,r=3.75);
    translate([0.88,hy,hz]) rotate([0,90,0]) cylinder(h=3.4400000000000004,d=bore);
    translate([150.68,hy,hz]) rotate([0,90,0]) cylinder(h=3.4400000000000004,d=bore);
// Rear center FPC pass-through (bend, EMC and flex cycles NOT VERIFIED).
    translate([63.5,D-wall-0.1,HBASE-3.5]) cube([28,wall+0.2,4.1]);
  }
}
base_shell();
// main file
// Two full panel-thickness proxy solids, NOT manufacturer STEP geometry.
use <base_shell.scad>
use <lid_shell.scad>
hy=76.6;hz=12.5;angle=-135.0;
color([0.12,0.17,0.23]) base_shell();
color([0.31,0.44,0.53]) translate([0,hy,hz]) rotate([angle,0,0]) translate([0,-hy,-hz]) lid_shell();
color([0.03,0.08,0.10]) translate([13.700000000000003,3.3500000000000014,8.649999999999999]) cube([127.6,73.3,3.45]);
translate([0,hy,hz]) rotate([angle,0,0]) translate([0,-hy,-hz]) {
  color([0.03,0.08,0.10]) translate([13.700000000000003,3.3500000000000014,12.9]) cube([127.6,73.3,3.45]);
}
